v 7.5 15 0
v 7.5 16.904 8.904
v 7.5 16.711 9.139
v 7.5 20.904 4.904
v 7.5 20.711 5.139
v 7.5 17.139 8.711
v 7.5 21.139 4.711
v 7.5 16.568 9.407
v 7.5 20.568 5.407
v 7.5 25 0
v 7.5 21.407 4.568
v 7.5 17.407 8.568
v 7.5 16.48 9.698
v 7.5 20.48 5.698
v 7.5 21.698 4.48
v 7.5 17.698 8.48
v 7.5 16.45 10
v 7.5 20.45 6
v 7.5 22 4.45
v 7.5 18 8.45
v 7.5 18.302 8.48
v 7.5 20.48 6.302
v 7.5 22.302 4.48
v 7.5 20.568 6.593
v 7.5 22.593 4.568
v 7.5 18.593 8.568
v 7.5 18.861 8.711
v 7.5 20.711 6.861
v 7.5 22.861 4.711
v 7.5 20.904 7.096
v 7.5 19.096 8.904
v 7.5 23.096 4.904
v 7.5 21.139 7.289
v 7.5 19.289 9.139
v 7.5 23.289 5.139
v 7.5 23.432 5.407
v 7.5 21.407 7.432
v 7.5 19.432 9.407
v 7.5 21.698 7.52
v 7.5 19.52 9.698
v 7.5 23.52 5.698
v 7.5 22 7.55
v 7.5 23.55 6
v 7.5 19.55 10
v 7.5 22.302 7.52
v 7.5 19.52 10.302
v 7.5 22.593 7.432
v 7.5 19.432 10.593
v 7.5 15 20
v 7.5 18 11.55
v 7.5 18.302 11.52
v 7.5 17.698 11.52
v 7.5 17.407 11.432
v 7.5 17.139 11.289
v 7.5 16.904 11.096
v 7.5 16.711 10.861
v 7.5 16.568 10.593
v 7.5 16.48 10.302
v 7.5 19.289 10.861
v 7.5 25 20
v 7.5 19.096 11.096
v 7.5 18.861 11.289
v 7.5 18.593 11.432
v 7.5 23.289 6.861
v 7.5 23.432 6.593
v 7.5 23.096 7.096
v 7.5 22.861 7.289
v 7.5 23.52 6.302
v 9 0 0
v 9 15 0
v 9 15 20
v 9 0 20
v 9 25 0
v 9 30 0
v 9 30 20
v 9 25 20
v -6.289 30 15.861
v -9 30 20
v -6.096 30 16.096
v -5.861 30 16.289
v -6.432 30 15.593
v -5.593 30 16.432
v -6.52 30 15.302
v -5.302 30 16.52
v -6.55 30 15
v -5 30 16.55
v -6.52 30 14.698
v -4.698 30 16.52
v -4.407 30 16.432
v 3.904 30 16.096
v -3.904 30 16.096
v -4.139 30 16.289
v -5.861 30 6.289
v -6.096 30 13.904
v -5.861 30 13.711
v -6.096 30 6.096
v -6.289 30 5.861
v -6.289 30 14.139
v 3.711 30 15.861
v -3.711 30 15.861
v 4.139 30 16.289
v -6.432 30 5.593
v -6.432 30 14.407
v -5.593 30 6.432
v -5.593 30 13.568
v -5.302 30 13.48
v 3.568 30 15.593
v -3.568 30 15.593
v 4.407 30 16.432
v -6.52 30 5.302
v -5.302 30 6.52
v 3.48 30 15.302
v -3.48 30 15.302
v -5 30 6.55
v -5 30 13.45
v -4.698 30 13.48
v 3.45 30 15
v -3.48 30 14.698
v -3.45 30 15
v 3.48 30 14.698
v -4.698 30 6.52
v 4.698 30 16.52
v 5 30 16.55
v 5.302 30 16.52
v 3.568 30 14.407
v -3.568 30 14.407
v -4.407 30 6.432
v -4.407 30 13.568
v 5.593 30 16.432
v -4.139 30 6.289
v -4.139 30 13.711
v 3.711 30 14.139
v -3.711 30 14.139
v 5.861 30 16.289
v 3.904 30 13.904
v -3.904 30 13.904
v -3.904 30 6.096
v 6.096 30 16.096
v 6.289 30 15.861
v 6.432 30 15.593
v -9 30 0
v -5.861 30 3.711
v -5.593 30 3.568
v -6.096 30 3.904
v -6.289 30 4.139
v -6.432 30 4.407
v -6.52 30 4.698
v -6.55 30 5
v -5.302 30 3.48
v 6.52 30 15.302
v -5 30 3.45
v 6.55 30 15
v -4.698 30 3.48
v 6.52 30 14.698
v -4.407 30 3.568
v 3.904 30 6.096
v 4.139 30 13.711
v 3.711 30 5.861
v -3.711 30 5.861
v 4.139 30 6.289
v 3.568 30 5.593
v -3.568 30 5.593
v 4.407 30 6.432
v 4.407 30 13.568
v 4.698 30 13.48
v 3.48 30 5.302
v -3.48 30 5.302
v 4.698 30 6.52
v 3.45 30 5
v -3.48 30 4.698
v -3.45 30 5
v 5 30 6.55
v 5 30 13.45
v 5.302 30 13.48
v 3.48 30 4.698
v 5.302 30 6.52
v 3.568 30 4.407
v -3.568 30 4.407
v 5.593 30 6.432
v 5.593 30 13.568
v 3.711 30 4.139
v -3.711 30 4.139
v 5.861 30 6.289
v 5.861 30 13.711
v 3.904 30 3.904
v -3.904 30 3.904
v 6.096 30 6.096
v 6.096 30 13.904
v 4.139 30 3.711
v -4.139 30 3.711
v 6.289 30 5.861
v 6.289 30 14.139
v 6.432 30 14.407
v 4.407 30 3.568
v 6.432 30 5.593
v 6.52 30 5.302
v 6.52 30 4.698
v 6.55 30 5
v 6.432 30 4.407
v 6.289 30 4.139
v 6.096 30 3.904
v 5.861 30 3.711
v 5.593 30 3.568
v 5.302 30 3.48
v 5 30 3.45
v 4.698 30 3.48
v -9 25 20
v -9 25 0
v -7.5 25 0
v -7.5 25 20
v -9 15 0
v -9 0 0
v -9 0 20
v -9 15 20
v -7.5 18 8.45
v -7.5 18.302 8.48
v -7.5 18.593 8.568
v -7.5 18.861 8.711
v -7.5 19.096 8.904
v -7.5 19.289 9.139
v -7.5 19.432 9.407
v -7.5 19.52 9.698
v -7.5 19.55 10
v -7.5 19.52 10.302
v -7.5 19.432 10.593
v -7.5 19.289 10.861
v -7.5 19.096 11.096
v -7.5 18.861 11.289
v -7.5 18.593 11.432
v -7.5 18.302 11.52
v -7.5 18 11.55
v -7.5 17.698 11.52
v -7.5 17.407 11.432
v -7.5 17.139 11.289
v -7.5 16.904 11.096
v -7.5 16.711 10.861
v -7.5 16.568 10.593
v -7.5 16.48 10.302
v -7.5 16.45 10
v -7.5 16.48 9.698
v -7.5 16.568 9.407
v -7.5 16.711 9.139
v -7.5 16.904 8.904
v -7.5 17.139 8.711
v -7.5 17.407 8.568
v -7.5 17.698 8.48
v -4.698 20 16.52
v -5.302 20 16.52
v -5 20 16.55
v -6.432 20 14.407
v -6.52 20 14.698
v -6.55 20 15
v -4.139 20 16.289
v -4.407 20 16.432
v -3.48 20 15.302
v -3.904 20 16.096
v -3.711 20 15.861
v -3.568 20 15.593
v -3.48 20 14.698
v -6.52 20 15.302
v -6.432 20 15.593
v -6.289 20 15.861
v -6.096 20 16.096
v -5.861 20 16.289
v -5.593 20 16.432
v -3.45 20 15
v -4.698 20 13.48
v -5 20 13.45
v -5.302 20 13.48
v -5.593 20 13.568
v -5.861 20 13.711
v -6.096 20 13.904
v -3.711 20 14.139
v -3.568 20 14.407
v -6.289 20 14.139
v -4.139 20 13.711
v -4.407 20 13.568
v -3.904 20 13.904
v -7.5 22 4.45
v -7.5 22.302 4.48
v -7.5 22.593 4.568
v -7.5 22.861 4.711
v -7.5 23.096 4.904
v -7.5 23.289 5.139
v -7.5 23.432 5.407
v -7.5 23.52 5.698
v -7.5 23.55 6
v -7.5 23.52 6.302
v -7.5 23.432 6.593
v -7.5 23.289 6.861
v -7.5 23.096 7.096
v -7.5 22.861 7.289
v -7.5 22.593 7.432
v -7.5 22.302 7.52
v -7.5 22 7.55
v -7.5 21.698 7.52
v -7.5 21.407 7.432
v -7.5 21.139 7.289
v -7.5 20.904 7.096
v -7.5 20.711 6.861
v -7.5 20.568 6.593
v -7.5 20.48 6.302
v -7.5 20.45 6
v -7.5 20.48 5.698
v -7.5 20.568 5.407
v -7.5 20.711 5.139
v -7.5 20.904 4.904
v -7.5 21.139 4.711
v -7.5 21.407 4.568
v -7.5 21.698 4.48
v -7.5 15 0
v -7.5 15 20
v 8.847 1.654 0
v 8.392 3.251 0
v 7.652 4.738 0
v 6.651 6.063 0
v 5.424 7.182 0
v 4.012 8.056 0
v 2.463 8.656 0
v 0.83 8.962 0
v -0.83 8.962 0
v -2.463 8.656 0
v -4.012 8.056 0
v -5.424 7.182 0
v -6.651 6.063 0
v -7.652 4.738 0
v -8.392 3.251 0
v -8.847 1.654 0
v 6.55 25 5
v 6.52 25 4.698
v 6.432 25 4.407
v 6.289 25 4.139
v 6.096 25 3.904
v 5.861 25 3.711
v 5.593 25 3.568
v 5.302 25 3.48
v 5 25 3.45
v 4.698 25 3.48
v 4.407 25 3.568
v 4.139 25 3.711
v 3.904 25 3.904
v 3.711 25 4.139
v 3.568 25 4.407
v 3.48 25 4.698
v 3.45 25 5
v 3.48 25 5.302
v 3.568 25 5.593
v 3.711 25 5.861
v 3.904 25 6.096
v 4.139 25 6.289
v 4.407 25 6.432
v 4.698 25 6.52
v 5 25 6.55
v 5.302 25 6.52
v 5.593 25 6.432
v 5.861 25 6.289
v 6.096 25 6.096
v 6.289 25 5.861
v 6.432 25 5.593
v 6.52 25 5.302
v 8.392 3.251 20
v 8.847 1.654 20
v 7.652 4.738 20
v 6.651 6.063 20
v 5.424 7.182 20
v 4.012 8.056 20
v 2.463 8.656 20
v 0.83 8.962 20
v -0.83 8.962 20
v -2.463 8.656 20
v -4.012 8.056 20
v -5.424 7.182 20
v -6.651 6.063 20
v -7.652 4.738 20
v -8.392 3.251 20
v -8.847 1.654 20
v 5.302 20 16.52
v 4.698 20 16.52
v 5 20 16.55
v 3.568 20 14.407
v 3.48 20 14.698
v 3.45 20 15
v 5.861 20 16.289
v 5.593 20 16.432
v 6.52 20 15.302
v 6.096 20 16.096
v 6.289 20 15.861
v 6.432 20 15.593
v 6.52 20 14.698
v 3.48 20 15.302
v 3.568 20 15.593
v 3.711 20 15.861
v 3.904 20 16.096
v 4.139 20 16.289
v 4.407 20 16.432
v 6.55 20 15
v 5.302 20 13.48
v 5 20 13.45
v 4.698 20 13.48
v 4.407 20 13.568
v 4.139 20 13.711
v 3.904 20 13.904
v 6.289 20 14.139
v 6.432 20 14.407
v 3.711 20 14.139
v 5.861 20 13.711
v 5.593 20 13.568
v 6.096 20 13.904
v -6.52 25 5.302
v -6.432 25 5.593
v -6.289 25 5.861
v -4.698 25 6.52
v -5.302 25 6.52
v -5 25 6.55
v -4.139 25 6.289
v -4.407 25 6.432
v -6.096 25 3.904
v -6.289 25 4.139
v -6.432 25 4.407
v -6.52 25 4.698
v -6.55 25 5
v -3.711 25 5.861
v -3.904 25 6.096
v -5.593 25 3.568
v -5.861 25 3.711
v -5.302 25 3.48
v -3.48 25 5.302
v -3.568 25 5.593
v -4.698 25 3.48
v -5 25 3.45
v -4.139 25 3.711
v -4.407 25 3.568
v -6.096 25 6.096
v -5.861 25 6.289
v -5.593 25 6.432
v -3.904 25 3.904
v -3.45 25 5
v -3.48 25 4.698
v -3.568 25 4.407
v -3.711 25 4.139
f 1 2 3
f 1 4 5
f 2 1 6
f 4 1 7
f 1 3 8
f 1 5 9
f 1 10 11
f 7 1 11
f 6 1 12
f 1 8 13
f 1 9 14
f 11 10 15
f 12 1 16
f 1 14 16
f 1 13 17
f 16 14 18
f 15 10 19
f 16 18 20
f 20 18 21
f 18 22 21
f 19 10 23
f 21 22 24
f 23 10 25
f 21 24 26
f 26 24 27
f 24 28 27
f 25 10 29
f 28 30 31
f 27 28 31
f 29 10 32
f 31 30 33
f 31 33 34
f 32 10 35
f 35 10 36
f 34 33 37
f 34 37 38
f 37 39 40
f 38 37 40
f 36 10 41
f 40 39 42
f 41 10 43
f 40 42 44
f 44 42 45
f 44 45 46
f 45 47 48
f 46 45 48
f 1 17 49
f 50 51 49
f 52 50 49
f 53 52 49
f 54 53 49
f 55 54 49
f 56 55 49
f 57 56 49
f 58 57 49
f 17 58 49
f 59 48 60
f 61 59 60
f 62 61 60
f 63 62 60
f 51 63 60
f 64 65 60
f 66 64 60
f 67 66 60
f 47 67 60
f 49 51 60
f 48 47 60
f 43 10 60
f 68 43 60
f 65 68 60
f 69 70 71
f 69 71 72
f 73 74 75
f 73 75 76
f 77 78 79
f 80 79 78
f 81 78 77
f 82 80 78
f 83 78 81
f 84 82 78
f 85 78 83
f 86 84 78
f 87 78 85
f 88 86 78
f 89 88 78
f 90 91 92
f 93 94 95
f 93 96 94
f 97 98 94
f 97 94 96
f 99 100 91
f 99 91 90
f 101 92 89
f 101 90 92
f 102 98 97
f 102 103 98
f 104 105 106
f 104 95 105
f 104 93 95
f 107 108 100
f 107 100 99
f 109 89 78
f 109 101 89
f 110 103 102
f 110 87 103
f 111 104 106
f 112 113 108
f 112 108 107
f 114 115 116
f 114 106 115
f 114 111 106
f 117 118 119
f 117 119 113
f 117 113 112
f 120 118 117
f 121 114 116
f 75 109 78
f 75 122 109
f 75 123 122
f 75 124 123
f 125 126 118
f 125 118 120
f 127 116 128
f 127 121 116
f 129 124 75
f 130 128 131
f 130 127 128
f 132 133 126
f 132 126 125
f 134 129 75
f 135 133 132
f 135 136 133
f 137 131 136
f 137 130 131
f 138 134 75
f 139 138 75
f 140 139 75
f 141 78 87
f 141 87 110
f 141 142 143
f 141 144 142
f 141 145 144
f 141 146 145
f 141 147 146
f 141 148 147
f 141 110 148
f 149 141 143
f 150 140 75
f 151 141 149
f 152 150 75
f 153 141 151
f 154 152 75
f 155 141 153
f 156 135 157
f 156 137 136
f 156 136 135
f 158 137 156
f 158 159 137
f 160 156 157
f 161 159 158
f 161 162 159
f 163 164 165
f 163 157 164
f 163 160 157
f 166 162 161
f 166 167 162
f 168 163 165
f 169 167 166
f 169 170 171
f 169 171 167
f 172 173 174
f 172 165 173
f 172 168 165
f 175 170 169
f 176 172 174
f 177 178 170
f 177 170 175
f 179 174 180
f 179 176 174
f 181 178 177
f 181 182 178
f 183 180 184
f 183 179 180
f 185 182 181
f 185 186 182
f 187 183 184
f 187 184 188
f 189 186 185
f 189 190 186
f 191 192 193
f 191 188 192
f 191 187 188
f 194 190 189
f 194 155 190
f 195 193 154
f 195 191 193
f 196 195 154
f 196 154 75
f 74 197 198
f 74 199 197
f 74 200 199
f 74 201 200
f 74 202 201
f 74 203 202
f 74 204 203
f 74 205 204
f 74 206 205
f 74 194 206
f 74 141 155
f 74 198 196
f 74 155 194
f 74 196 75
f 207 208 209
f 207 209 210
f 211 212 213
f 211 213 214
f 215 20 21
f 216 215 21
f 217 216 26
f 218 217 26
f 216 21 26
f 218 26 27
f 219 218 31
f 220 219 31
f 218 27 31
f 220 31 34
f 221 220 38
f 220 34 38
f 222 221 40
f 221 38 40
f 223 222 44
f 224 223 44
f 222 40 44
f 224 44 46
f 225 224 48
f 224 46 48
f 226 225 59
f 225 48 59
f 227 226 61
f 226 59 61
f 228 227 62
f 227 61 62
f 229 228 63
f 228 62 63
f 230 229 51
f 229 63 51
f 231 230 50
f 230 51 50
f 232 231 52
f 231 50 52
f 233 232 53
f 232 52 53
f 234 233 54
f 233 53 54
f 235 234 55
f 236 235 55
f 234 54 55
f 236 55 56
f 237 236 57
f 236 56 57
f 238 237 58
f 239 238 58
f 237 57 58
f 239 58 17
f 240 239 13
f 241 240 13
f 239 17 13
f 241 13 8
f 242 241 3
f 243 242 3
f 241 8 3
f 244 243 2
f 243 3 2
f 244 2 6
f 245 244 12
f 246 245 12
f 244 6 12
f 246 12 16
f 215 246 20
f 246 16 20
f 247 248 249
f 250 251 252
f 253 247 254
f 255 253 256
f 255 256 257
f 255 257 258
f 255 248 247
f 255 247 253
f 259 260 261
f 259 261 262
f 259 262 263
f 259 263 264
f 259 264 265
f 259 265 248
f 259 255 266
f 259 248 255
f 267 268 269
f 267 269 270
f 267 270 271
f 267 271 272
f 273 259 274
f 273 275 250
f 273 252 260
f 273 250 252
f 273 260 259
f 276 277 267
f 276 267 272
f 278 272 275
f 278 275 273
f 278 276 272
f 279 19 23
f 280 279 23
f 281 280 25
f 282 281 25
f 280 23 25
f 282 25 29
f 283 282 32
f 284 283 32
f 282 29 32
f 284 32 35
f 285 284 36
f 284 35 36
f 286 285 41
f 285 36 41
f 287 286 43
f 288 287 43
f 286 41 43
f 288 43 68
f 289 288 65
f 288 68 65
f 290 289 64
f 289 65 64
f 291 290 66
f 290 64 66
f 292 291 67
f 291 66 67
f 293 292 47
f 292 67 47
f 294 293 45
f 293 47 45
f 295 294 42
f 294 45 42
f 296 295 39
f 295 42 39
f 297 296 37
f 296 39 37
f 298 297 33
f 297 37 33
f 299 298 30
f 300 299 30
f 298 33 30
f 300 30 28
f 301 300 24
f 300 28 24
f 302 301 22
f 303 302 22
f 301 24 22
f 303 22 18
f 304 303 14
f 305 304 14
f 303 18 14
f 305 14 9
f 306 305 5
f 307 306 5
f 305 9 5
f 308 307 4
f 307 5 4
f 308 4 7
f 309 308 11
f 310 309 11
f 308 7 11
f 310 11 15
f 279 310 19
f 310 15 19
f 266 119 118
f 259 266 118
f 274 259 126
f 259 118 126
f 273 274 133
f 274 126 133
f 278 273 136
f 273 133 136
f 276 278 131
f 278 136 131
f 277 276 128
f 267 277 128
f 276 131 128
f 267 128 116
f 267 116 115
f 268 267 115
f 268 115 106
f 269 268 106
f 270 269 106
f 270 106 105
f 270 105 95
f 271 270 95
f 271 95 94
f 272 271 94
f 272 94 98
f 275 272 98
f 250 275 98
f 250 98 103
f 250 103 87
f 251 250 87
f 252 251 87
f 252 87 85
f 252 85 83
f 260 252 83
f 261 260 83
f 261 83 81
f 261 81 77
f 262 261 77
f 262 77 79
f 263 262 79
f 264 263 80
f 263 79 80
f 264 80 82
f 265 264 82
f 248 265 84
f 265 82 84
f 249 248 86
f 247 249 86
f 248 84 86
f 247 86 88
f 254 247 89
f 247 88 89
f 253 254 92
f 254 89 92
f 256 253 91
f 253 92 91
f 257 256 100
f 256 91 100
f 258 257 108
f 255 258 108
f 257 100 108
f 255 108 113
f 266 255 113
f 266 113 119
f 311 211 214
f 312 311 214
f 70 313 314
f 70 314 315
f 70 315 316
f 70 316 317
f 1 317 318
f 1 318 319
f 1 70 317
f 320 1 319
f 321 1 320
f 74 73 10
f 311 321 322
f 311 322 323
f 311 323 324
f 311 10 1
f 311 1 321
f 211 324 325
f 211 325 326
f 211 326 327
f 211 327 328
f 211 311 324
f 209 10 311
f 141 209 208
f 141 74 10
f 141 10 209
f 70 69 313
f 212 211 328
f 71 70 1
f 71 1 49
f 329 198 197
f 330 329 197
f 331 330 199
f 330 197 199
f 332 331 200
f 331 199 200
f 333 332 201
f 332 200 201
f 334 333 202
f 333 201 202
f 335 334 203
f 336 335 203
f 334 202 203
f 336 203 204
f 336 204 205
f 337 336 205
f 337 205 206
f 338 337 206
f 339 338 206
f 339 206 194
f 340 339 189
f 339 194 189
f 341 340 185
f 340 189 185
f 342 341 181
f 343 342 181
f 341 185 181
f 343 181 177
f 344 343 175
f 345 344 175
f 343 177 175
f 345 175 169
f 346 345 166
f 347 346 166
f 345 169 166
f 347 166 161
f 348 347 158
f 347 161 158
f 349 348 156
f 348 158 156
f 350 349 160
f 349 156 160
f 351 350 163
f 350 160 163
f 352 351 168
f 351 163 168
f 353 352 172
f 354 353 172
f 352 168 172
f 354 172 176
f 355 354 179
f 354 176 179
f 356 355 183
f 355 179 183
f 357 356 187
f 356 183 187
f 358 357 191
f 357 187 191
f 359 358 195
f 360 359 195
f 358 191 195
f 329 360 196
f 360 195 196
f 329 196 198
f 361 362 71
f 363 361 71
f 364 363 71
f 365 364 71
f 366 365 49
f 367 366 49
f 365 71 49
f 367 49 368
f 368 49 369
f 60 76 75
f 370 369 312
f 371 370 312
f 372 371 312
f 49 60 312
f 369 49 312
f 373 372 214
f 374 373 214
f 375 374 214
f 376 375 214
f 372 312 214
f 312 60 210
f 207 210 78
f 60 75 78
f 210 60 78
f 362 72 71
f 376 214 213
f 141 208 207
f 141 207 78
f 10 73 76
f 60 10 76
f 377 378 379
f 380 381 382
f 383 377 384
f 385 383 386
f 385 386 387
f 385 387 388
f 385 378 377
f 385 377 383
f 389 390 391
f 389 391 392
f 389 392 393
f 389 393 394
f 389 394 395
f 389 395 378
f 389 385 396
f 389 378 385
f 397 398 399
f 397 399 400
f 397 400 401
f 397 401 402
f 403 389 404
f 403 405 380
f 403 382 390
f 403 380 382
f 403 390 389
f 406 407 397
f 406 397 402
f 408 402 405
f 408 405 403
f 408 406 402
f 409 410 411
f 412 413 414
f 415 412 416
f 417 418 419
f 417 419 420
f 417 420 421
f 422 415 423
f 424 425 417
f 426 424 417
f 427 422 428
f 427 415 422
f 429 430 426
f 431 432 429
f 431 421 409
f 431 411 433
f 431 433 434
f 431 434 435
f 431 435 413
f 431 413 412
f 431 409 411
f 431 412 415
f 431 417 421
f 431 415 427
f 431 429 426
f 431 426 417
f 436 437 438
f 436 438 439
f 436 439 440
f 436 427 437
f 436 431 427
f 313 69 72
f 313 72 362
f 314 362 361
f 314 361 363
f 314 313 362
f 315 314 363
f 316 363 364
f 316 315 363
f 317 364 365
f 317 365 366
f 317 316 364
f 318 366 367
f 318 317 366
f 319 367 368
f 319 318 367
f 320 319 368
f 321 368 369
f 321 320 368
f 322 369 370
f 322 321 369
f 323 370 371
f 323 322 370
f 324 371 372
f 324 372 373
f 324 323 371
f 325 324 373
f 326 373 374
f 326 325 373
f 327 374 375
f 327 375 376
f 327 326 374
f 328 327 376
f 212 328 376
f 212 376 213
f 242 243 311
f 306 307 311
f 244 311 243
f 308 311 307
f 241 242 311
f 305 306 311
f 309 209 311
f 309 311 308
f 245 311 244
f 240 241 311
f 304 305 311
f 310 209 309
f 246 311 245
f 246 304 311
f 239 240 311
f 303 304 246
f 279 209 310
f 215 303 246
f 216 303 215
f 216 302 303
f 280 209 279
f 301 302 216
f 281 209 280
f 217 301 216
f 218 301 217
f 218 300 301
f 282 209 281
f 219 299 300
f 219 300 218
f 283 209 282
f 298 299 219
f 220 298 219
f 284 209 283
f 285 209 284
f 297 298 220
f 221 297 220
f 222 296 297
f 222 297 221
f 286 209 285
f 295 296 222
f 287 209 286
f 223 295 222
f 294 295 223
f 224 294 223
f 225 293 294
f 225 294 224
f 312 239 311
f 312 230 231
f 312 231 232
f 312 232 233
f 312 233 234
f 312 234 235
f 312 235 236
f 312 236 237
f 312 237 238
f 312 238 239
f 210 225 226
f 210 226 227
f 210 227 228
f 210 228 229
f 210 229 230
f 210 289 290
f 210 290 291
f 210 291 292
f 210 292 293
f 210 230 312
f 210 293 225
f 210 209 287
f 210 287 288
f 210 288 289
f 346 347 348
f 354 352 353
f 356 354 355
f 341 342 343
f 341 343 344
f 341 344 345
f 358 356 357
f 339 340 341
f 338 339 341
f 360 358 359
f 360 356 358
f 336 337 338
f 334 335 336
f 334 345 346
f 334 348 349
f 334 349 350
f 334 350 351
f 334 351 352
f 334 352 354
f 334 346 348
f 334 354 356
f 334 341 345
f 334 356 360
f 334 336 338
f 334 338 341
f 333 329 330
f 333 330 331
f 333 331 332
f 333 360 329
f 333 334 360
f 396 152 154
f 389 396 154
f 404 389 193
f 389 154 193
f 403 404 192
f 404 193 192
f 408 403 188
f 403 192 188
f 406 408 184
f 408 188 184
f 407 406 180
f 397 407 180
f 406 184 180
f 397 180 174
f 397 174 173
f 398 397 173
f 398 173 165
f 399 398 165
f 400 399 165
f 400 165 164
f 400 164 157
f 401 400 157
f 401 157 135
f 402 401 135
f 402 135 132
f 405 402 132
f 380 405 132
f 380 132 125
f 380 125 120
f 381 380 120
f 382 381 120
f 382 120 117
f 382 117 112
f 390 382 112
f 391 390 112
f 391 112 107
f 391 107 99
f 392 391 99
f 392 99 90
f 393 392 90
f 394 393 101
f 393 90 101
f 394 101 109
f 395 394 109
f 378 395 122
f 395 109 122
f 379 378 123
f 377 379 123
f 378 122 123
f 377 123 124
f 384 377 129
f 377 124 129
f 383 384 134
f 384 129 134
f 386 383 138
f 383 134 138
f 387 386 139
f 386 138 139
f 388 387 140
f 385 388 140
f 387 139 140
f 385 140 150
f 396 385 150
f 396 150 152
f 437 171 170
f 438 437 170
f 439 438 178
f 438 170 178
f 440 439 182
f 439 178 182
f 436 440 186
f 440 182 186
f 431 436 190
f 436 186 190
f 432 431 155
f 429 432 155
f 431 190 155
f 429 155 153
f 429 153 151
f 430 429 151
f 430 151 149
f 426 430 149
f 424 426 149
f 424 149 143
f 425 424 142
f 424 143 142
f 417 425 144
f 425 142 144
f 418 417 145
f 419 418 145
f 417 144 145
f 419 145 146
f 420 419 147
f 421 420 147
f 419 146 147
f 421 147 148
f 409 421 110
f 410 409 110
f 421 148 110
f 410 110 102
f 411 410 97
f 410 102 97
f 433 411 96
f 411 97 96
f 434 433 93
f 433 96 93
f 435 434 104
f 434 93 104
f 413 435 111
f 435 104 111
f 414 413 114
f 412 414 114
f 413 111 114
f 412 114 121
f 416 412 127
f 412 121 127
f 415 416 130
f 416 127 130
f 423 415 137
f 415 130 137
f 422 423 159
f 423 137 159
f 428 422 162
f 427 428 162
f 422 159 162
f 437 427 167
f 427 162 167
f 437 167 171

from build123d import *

# Parameters (mm, degrees)
EXTRUDE_1_DEPTH     = 20
SKETCH_2_W          = 20
SKETCH_2_H          = 10
CUT_EXTRUDE_1_DEPTH = 1.5
SKETCH_3_R          = 1.55
CUT_EXTRUDE_2_DEPTH = 15
SKETCH_4_R          = 1.55
CUT_EXTRUDE_5_DEPTH = 5
SKETCH_6_R          = 1.55
CUT_EXTRUDE_6_DEPTH = 10


with BuildPart() as part:
    # 草图1 → 凸台-拉伸1 (new body)
    with BuildSketch(Plane.XY):
        with BuildLine():
            Line((-9, 0), (-9, 30))
            Line((-9, 30), (9, 30))
            Line((9, 30), (9, 0))
            ThreePointArc((9, 0), (0, 9), (-9, 0))
        make_face()
    extrude(amount=EXTRUDE_1_DEPTH)

    # 草图2 → 切除-拉伸1 (cut)
    with BuildSketch(Plane.ZY.offset(9)):
        with Locations((10, 20)):
            Rectangle(SKETCH_2_W, SKETCH_2_H)
    cut_extrude_1 = extrude(amount=-CUT_EXTRUDE_1_DEPTH, mode=Mode.SUBTRACT)

    # 镜向1: 切除-拉伸1 across plane
    add(cut_extrude_1.mirror(Plane(origin=(0, 0, 0), x_dir=(0, 0, 1), z_dir=(1, 0, 0))), mode=Mode.SUBTRACT)

    # 草图3 → 切除-拉伸2 (cut)
    with BuildSketch(Plane(origin=(7.5, 0, 0), x_dir=(0, 0, -1), z_dir=(1, 0, 0))):
        with Locations((-6, 22)):
            Circle(SKETCH_3_R)
        with Locations((-10, 18)):
            Circle(SKETCH_3_R)
    extrude(amount=-CUT_EXTRUDE_2_DEPTH, mode=Mode.SUBTRACT)

    # 草图4 → 切除-拉伸5 (cut)
    with BuildSketch(Plane(origin=(0, 30, 0), x_dir=(1, 0, 0), z_dir=(0, 1, 0))):
        with Locations((-5, -5)):
            Circle(SKETCH_4_R)
        with Locations((5, -5)):
            Circle(SKETCH_4_R)
        with Locations((5, -15)):
            Circle(SKETCH_4_R)
        with Locations((-5, -15)):
            Circle(SKETCH_4_R)
    extrude(amount=-CUT_EXTRUDE_5_DEPTH, mode=Mode.SUBTRACT)

    # 草图6 → 切除-拉伸6 (cut)
    with BuildSketch(Plane(origin=(0, 30, 0), x_dir=(1, 0, 0), z_dir=(0, 1, 0))):
        with Locations((-5, -15)):
            Circle(SKETCH_6_R)
        with Locations((5, -15)):
            Circle(SKETCH_6_R)
    extrude(amount=-CUT_EXTRUDE_6_DEPTH, mode=Mode.SUBTRACT)


solid = part.part
